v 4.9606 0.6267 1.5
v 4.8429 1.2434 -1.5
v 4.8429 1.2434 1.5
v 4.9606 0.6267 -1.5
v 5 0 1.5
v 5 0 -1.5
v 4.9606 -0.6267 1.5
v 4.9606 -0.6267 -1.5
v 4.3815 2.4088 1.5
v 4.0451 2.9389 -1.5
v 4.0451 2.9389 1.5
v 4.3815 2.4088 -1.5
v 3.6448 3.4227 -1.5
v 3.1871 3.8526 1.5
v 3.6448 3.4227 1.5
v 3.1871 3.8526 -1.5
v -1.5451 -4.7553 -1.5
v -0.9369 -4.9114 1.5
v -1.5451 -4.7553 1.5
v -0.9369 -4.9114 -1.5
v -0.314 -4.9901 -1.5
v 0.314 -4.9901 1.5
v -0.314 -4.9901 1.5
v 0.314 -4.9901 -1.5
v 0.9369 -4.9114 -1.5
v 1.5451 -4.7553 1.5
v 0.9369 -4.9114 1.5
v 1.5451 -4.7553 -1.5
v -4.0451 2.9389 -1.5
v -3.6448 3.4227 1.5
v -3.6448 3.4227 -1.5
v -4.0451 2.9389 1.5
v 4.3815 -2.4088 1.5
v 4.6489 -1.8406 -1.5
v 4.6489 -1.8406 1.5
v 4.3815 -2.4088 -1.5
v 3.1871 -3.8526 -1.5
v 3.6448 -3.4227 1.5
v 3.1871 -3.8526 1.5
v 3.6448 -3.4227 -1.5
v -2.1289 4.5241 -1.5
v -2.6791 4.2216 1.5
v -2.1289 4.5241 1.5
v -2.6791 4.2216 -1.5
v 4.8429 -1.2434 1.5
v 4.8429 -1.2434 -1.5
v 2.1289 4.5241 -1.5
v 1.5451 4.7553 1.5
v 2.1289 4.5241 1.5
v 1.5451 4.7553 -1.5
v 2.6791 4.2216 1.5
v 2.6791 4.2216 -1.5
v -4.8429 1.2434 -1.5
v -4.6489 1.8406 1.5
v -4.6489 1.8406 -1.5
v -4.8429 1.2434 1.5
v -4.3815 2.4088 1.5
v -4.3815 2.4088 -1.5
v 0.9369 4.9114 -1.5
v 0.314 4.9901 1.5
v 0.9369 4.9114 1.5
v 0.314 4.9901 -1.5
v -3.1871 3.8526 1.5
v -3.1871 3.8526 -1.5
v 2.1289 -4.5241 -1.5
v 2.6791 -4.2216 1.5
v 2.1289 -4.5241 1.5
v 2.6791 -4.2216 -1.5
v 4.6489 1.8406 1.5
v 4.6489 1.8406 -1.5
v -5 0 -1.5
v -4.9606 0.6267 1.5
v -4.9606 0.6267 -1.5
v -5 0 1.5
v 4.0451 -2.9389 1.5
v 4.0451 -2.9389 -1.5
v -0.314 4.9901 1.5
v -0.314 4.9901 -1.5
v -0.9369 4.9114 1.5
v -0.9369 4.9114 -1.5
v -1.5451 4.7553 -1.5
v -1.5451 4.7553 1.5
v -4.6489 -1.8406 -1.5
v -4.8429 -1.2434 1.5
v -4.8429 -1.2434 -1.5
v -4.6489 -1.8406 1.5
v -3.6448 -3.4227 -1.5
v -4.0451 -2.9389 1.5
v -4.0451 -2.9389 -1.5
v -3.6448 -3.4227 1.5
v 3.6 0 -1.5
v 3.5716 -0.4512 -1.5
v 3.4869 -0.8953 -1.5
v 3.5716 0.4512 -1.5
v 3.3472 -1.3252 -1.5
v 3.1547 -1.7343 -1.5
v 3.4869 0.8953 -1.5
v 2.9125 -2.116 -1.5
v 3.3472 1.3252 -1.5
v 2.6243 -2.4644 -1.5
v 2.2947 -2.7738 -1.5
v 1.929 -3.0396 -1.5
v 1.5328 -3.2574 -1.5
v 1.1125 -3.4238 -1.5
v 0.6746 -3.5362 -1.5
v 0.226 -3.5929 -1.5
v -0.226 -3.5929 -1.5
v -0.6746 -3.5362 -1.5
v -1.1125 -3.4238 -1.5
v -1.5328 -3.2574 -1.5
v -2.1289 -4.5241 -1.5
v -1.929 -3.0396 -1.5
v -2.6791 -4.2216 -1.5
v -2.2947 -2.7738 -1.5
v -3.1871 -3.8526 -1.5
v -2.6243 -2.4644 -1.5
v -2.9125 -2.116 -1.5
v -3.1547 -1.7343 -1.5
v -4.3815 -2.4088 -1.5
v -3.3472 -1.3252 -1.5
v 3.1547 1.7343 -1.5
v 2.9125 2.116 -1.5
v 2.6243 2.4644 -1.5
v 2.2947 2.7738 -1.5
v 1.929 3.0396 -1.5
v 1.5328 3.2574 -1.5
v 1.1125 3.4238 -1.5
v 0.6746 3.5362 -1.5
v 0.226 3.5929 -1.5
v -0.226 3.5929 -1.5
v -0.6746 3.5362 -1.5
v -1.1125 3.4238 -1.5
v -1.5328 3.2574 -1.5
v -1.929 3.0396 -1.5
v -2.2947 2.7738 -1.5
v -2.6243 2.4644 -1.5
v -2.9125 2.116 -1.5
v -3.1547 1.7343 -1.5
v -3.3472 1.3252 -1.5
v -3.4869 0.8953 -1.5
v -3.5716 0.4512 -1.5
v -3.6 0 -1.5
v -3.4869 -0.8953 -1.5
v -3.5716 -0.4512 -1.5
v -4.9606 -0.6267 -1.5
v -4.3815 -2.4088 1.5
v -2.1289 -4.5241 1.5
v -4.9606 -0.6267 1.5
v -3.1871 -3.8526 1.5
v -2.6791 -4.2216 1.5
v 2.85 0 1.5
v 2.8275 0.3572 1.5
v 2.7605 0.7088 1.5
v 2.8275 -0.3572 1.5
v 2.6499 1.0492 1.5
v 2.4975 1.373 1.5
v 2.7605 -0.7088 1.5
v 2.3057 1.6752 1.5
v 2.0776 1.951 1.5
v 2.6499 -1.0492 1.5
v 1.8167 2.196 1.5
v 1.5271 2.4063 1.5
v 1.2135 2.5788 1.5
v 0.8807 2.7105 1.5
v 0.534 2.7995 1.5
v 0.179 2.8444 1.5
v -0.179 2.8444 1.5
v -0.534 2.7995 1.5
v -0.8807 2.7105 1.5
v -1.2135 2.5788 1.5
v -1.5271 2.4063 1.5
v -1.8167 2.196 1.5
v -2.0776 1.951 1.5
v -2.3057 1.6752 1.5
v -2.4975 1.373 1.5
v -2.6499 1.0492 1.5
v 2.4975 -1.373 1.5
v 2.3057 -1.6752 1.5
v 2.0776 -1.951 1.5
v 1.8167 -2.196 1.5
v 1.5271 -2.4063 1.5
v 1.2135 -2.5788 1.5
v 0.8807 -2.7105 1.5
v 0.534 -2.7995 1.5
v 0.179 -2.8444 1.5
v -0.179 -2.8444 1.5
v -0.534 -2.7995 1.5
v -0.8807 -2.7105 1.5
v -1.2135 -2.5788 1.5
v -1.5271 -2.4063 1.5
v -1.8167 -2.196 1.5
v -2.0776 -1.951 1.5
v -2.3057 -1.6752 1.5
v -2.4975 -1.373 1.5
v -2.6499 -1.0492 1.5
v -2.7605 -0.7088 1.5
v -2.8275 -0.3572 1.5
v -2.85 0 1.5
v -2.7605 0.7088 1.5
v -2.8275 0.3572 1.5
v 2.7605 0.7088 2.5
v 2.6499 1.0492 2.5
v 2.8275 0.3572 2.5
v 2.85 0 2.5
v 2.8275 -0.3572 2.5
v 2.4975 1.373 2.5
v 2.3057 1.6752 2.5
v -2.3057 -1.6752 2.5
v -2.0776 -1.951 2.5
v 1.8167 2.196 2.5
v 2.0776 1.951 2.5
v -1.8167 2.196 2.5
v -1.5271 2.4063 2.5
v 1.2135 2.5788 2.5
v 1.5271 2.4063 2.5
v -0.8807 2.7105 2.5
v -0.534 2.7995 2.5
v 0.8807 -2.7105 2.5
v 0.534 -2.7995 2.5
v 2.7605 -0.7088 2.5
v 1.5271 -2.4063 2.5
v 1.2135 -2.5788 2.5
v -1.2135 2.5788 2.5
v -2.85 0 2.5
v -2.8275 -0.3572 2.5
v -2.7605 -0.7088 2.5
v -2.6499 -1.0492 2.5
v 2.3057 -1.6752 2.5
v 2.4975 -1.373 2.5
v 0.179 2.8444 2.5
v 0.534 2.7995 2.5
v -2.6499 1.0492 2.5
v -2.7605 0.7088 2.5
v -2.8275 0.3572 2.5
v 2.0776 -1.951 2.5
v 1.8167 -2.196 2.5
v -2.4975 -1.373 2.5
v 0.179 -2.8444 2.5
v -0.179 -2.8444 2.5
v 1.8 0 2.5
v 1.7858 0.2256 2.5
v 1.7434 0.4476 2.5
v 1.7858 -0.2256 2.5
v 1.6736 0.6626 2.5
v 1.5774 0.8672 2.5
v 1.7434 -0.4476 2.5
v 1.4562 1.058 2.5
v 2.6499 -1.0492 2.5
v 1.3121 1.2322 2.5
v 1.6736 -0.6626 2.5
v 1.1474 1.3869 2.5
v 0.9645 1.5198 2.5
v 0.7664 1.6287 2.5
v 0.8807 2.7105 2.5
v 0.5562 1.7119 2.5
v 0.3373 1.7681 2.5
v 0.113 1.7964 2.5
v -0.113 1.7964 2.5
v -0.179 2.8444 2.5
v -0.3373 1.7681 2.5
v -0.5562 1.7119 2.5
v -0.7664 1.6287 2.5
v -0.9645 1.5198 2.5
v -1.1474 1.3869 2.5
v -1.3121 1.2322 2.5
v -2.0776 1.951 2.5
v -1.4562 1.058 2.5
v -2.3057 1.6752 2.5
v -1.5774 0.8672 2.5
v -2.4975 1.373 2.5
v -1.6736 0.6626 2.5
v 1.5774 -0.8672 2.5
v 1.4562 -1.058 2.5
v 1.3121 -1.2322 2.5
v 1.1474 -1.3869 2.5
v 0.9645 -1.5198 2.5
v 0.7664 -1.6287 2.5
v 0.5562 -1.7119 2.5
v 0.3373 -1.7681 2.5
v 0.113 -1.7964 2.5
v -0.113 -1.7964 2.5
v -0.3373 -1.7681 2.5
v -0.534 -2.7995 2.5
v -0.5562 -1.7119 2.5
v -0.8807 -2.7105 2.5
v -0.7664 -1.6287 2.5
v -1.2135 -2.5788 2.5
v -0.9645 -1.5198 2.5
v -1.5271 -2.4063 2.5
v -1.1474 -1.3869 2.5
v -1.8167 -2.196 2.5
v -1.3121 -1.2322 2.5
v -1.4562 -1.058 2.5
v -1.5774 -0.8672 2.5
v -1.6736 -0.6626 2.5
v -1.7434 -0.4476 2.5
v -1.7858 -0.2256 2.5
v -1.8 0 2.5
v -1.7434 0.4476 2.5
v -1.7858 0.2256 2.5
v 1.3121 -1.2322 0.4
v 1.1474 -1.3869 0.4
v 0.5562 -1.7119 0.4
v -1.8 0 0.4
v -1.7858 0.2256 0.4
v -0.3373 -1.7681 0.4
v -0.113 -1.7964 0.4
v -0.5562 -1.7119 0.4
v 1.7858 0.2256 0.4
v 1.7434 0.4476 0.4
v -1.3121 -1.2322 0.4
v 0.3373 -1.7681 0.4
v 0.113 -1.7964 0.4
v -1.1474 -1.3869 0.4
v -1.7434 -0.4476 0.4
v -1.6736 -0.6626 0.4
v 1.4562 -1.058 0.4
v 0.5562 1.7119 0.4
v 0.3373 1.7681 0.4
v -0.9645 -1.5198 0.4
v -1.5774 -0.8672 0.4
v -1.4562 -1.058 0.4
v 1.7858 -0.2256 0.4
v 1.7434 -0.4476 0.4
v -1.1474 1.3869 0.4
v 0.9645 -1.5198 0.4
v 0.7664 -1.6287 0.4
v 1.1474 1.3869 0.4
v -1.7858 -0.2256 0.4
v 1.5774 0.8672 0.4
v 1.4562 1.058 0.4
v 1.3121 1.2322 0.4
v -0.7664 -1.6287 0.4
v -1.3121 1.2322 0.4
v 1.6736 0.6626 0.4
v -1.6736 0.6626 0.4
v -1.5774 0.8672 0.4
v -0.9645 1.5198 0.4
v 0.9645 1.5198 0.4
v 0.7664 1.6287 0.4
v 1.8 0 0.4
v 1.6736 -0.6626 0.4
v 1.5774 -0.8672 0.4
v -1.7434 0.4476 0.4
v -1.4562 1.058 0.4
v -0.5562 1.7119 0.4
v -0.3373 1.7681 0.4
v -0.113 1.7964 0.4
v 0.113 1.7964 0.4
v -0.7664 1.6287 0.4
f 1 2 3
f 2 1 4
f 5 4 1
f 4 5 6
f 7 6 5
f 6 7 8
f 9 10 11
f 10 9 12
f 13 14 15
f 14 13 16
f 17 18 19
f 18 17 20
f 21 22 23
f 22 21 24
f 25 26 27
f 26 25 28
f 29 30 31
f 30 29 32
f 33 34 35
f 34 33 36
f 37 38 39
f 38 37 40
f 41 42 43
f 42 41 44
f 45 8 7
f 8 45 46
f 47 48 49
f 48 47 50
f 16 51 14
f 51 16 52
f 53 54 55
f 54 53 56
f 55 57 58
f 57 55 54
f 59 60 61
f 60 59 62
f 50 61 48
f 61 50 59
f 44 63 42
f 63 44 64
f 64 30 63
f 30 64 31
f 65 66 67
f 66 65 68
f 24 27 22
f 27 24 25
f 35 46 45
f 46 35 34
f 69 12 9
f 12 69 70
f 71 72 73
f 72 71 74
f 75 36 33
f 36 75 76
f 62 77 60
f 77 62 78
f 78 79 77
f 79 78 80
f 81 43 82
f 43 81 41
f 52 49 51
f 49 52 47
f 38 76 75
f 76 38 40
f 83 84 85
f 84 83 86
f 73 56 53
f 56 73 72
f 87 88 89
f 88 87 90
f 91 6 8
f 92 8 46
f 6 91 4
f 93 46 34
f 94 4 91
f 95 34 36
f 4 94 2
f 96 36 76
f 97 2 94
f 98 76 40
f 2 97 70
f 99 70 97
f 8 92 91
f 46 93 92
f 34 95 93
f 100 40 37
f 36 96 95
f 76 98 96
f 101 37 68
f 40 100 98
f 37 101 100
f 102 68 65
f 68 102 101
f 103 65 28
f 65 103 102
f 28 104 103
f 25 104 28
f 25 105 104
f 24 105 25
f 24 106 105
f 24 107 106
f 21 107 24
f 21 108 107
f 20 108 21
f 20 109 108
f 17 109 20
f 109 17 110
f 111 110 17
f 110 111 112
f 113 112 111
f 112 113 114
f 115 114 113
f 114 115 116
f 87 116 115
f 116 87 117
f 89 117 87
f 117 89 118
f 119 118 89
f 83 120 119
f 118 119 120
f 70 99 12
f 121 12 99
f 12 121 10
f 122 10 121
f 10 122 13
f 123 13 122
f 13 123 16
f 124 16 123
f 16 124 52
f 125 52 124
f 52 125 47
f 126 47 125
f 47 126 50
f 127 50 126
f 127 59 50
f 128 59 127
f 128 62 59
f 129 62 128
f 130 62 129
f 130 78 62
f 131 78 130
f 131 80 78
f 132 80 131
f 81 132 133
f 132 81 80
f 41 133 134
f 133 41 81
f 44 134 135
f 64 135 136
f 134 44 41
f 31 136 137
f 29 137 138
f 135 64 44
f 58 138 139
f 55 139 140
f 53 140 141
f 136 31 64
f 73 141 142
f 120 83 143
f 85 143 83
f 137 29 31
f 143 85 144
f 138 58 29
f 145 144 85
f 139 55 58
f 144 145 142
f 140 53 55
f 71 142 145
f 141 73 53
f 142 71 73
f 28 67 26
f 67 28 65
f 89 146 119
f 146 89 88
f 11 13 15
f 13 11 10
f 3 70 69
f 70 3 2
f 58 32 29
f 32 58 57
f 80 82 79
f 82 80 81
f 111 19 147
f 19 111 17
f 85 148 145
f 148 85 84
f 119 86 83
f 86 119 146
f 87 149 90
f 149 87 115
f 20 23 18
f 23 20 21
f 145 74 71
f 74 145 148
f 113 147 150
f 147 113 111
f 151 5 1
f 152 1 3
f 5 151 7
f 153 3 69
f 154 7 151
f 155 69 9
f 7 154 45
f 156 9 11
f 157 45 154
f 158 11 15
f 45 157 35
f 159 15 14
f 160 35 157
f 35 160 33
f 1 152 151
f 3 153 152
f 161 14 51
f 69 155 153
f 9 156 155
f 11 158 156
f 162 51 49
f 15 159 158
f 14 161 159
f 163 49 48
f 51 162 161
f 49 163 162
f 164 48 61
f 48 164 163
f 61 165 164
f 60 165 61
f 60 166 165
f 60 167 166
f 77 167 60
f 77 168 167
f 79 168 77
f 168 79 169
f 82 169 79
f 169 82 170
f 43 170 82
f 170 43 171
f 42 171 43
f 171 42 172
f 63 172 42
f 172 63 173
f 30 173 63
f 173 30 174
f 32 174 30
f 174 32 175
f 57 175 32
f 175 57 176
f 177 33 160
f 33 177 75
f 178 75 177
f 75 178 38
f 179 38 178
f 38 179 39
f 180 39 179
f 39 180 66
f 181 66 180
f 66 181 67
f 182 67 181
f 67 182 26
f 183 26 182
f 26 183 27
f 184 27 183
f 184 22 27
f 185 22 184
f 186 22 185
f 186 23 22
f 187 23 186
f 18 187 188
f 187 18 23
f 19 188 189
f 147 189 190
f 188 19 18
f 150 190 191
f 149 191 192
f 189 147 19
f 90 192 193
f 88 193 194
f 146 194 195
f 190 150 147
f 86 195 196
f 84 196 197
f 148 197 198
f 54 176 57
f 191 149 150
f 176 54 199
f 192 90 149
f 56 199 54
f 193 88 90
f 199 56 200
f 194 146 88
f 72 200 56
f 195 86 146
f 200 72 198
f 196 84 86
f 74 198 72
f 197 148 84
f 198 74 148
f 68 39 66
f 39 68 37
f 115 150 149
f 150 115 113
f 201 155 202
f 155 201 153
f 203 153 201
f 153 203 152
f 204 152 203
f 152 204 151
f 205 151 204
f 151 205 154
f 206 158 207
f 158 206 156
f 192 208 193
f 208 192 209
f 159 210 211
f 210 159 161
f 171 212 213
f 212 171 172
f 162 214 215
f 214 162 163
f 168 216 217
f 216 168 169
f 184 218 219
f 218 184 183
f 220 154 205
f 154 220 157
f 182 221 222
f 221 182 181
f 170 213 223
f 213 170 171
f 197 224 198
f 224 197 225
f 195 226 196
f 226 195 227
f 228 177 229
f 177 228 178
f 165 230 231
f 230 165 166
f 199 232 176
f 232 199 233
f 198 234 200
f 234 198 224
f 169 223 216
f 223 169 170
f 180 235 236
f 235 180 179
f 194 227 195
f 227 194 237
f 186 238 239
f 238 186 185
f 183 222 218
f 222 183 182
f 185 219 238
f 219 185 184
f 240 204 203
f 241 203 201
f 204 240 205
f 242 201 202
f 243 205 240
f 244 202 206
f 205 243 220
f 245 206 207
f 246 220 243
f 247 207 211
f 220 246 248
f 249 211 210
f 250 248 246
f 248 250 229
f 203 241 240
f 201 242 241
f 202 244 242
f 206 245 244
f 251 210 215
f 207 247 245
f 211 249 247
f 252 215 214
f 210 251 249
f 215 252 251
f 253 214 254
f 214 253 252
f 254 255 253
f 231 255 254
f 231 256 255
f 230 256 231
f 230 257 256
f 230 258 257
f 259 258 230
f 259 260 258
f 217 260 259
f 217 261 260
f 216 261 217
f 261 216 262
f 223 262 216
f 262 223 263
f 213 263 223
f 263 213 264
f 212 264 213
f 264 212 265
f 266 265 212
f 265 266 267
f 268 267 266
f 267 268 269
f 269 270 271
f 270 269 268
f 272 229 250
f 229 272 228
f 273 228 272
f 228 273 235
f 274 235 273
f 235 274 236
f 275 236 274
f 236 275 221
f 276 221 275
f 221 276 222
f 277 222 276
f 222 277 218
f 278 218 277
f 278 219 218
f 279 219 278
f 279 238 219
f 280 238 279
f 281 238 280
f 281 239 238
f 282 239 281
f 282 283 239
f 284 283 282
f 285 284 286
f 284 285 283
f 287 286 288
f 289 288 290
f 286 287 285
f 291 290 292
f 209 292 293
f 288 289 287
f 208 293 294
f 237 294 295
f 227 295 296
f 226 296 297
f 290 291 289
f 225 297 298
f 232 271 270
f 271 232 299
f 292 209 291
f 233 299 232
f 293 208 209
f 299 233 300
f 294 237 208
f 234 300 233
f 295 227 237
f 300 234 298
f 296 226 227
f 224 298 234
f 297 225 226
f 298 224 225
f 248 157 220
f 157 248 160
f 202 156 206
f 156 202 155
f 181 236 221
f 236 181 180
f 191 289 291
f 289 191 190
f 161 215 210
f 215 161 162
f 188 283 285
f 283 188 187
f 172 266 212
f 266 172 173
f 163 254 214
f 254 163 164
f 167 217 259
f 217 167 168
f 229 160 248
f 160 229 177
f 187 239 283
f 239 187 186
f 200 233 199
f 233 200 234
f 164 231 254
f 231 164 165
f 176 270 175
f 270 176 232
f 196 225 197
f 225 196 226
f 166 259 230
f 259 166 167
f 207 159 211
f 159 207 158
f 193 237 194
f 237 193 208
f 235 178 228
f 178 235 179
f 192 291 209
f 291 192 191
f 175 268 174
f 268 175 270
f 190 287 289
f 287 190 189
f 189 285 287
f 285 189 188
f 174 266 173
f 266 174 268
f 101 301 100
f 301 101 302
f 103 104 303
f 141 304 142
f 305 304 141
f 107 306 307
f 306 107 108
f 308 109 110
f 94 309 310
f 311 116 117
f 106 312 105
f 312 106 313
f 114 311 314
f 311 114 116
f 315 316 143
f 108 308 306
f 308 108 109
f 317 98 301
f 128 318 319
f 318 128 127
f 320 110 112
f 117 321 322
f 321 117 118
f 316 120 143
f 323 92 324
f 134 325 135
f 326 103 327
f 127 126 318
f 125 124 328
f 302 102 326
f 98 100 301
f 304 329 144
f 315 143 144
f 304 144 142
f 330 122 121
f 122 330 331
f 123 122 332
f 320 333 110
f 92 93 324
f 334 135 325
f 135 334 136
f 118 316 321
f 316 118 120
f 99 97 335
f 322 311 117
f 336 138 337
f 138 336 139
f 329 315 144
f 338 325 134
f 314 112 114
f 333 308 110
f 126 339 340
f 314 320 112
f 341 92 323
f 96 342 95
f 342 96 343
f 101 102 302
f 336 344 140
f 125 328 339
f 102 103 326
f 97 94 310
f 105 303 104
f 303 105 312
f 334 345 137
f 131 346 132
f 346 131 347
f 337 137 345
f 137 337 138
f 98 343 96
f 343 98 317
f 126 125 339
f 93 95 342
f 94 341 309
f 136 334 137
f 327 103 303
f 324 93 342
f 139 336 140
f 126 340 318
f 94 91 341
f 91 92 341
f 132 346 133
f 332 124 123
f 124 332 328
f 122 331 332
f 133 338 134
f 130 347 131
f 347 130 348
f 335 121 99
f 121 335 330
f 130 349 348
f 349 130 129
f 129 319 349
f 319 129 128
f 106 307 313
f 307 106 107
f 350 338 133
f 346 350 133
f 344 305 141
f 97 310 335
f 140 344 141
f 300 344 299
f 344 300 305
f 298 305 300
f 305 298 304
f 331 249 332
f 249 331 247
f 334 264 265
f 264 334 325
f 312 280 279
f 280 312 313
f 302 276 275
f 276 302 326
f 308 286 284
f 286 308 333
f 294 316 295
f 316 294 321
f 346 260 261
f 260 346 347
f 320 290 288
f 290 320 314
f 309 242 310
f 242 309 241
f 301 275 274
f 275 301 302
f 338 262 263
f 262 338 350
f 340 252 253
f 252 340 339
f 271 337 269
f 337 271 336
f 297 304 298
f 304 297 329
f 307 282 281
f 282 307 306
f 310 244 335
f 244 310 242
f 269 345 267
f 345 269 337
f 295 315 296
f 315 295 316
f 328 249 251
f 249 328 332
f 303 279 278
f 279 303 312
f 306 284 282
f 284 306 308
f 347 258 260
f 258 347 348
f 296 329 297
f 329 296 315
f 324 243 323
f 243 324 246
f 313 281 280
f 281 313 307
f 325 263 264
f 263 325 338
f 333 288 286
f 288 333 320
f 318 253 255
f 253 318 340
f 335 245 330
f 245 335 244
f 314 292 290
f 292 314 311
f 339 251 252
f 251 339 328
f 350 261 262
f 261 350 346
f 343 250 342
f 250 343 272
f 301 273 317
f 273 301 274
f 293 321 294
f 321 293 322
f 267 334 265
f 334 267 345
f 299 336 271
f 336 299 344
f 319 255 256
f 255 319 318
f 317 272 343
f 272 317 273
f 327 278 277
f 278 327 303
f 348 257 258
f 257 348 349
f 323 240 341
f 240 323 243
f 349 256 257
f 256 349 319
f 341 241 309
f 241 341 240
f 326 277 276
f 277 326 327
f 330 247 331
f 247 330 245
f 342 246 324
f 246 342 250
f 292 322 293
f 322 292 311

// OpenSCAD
$fn = 50;


difference() {
	union() {
		translate(v = [0, 0, -1.5000000000]) {
			cylinder(h = 3, r = 5.0000000000);
		}
		translate(v = [0, 0, -1.5000000000]) {
			cylinder(h = 4, r = 2.8500000000);
		}
	}
	union() {
		translate(v = [0, 0, -1.5000000000]) {
			rotate(a = [0, 180, 0]) {
				difference() {
					union() {
						translate(v = [0, 0, -4.0000000000]) {
							cylinder(h = 4, r = 1.5000000000);
						}
						translate(v = [0, 0, -1.9000000000]) {
							cylinder(h = 1.9000000000, r1 = 1.8000000000, r2 = 3.6000000000);
						}
						translate(v = [0, 0, -4.0000000000]) {
							cylinder(h = 4, r = 1.8000000000);
						}
						translate(v = [0, 0, -4.0000000000]) {
							cylinder(h = 4, r = 1.5000000000);
						}
					}
					union();
				}
			}
		}
		translate(v = [0, 0, -100.0000000000]) {
			cylinder(h = 200, r = 1.8000000000);
		}
	}
}
